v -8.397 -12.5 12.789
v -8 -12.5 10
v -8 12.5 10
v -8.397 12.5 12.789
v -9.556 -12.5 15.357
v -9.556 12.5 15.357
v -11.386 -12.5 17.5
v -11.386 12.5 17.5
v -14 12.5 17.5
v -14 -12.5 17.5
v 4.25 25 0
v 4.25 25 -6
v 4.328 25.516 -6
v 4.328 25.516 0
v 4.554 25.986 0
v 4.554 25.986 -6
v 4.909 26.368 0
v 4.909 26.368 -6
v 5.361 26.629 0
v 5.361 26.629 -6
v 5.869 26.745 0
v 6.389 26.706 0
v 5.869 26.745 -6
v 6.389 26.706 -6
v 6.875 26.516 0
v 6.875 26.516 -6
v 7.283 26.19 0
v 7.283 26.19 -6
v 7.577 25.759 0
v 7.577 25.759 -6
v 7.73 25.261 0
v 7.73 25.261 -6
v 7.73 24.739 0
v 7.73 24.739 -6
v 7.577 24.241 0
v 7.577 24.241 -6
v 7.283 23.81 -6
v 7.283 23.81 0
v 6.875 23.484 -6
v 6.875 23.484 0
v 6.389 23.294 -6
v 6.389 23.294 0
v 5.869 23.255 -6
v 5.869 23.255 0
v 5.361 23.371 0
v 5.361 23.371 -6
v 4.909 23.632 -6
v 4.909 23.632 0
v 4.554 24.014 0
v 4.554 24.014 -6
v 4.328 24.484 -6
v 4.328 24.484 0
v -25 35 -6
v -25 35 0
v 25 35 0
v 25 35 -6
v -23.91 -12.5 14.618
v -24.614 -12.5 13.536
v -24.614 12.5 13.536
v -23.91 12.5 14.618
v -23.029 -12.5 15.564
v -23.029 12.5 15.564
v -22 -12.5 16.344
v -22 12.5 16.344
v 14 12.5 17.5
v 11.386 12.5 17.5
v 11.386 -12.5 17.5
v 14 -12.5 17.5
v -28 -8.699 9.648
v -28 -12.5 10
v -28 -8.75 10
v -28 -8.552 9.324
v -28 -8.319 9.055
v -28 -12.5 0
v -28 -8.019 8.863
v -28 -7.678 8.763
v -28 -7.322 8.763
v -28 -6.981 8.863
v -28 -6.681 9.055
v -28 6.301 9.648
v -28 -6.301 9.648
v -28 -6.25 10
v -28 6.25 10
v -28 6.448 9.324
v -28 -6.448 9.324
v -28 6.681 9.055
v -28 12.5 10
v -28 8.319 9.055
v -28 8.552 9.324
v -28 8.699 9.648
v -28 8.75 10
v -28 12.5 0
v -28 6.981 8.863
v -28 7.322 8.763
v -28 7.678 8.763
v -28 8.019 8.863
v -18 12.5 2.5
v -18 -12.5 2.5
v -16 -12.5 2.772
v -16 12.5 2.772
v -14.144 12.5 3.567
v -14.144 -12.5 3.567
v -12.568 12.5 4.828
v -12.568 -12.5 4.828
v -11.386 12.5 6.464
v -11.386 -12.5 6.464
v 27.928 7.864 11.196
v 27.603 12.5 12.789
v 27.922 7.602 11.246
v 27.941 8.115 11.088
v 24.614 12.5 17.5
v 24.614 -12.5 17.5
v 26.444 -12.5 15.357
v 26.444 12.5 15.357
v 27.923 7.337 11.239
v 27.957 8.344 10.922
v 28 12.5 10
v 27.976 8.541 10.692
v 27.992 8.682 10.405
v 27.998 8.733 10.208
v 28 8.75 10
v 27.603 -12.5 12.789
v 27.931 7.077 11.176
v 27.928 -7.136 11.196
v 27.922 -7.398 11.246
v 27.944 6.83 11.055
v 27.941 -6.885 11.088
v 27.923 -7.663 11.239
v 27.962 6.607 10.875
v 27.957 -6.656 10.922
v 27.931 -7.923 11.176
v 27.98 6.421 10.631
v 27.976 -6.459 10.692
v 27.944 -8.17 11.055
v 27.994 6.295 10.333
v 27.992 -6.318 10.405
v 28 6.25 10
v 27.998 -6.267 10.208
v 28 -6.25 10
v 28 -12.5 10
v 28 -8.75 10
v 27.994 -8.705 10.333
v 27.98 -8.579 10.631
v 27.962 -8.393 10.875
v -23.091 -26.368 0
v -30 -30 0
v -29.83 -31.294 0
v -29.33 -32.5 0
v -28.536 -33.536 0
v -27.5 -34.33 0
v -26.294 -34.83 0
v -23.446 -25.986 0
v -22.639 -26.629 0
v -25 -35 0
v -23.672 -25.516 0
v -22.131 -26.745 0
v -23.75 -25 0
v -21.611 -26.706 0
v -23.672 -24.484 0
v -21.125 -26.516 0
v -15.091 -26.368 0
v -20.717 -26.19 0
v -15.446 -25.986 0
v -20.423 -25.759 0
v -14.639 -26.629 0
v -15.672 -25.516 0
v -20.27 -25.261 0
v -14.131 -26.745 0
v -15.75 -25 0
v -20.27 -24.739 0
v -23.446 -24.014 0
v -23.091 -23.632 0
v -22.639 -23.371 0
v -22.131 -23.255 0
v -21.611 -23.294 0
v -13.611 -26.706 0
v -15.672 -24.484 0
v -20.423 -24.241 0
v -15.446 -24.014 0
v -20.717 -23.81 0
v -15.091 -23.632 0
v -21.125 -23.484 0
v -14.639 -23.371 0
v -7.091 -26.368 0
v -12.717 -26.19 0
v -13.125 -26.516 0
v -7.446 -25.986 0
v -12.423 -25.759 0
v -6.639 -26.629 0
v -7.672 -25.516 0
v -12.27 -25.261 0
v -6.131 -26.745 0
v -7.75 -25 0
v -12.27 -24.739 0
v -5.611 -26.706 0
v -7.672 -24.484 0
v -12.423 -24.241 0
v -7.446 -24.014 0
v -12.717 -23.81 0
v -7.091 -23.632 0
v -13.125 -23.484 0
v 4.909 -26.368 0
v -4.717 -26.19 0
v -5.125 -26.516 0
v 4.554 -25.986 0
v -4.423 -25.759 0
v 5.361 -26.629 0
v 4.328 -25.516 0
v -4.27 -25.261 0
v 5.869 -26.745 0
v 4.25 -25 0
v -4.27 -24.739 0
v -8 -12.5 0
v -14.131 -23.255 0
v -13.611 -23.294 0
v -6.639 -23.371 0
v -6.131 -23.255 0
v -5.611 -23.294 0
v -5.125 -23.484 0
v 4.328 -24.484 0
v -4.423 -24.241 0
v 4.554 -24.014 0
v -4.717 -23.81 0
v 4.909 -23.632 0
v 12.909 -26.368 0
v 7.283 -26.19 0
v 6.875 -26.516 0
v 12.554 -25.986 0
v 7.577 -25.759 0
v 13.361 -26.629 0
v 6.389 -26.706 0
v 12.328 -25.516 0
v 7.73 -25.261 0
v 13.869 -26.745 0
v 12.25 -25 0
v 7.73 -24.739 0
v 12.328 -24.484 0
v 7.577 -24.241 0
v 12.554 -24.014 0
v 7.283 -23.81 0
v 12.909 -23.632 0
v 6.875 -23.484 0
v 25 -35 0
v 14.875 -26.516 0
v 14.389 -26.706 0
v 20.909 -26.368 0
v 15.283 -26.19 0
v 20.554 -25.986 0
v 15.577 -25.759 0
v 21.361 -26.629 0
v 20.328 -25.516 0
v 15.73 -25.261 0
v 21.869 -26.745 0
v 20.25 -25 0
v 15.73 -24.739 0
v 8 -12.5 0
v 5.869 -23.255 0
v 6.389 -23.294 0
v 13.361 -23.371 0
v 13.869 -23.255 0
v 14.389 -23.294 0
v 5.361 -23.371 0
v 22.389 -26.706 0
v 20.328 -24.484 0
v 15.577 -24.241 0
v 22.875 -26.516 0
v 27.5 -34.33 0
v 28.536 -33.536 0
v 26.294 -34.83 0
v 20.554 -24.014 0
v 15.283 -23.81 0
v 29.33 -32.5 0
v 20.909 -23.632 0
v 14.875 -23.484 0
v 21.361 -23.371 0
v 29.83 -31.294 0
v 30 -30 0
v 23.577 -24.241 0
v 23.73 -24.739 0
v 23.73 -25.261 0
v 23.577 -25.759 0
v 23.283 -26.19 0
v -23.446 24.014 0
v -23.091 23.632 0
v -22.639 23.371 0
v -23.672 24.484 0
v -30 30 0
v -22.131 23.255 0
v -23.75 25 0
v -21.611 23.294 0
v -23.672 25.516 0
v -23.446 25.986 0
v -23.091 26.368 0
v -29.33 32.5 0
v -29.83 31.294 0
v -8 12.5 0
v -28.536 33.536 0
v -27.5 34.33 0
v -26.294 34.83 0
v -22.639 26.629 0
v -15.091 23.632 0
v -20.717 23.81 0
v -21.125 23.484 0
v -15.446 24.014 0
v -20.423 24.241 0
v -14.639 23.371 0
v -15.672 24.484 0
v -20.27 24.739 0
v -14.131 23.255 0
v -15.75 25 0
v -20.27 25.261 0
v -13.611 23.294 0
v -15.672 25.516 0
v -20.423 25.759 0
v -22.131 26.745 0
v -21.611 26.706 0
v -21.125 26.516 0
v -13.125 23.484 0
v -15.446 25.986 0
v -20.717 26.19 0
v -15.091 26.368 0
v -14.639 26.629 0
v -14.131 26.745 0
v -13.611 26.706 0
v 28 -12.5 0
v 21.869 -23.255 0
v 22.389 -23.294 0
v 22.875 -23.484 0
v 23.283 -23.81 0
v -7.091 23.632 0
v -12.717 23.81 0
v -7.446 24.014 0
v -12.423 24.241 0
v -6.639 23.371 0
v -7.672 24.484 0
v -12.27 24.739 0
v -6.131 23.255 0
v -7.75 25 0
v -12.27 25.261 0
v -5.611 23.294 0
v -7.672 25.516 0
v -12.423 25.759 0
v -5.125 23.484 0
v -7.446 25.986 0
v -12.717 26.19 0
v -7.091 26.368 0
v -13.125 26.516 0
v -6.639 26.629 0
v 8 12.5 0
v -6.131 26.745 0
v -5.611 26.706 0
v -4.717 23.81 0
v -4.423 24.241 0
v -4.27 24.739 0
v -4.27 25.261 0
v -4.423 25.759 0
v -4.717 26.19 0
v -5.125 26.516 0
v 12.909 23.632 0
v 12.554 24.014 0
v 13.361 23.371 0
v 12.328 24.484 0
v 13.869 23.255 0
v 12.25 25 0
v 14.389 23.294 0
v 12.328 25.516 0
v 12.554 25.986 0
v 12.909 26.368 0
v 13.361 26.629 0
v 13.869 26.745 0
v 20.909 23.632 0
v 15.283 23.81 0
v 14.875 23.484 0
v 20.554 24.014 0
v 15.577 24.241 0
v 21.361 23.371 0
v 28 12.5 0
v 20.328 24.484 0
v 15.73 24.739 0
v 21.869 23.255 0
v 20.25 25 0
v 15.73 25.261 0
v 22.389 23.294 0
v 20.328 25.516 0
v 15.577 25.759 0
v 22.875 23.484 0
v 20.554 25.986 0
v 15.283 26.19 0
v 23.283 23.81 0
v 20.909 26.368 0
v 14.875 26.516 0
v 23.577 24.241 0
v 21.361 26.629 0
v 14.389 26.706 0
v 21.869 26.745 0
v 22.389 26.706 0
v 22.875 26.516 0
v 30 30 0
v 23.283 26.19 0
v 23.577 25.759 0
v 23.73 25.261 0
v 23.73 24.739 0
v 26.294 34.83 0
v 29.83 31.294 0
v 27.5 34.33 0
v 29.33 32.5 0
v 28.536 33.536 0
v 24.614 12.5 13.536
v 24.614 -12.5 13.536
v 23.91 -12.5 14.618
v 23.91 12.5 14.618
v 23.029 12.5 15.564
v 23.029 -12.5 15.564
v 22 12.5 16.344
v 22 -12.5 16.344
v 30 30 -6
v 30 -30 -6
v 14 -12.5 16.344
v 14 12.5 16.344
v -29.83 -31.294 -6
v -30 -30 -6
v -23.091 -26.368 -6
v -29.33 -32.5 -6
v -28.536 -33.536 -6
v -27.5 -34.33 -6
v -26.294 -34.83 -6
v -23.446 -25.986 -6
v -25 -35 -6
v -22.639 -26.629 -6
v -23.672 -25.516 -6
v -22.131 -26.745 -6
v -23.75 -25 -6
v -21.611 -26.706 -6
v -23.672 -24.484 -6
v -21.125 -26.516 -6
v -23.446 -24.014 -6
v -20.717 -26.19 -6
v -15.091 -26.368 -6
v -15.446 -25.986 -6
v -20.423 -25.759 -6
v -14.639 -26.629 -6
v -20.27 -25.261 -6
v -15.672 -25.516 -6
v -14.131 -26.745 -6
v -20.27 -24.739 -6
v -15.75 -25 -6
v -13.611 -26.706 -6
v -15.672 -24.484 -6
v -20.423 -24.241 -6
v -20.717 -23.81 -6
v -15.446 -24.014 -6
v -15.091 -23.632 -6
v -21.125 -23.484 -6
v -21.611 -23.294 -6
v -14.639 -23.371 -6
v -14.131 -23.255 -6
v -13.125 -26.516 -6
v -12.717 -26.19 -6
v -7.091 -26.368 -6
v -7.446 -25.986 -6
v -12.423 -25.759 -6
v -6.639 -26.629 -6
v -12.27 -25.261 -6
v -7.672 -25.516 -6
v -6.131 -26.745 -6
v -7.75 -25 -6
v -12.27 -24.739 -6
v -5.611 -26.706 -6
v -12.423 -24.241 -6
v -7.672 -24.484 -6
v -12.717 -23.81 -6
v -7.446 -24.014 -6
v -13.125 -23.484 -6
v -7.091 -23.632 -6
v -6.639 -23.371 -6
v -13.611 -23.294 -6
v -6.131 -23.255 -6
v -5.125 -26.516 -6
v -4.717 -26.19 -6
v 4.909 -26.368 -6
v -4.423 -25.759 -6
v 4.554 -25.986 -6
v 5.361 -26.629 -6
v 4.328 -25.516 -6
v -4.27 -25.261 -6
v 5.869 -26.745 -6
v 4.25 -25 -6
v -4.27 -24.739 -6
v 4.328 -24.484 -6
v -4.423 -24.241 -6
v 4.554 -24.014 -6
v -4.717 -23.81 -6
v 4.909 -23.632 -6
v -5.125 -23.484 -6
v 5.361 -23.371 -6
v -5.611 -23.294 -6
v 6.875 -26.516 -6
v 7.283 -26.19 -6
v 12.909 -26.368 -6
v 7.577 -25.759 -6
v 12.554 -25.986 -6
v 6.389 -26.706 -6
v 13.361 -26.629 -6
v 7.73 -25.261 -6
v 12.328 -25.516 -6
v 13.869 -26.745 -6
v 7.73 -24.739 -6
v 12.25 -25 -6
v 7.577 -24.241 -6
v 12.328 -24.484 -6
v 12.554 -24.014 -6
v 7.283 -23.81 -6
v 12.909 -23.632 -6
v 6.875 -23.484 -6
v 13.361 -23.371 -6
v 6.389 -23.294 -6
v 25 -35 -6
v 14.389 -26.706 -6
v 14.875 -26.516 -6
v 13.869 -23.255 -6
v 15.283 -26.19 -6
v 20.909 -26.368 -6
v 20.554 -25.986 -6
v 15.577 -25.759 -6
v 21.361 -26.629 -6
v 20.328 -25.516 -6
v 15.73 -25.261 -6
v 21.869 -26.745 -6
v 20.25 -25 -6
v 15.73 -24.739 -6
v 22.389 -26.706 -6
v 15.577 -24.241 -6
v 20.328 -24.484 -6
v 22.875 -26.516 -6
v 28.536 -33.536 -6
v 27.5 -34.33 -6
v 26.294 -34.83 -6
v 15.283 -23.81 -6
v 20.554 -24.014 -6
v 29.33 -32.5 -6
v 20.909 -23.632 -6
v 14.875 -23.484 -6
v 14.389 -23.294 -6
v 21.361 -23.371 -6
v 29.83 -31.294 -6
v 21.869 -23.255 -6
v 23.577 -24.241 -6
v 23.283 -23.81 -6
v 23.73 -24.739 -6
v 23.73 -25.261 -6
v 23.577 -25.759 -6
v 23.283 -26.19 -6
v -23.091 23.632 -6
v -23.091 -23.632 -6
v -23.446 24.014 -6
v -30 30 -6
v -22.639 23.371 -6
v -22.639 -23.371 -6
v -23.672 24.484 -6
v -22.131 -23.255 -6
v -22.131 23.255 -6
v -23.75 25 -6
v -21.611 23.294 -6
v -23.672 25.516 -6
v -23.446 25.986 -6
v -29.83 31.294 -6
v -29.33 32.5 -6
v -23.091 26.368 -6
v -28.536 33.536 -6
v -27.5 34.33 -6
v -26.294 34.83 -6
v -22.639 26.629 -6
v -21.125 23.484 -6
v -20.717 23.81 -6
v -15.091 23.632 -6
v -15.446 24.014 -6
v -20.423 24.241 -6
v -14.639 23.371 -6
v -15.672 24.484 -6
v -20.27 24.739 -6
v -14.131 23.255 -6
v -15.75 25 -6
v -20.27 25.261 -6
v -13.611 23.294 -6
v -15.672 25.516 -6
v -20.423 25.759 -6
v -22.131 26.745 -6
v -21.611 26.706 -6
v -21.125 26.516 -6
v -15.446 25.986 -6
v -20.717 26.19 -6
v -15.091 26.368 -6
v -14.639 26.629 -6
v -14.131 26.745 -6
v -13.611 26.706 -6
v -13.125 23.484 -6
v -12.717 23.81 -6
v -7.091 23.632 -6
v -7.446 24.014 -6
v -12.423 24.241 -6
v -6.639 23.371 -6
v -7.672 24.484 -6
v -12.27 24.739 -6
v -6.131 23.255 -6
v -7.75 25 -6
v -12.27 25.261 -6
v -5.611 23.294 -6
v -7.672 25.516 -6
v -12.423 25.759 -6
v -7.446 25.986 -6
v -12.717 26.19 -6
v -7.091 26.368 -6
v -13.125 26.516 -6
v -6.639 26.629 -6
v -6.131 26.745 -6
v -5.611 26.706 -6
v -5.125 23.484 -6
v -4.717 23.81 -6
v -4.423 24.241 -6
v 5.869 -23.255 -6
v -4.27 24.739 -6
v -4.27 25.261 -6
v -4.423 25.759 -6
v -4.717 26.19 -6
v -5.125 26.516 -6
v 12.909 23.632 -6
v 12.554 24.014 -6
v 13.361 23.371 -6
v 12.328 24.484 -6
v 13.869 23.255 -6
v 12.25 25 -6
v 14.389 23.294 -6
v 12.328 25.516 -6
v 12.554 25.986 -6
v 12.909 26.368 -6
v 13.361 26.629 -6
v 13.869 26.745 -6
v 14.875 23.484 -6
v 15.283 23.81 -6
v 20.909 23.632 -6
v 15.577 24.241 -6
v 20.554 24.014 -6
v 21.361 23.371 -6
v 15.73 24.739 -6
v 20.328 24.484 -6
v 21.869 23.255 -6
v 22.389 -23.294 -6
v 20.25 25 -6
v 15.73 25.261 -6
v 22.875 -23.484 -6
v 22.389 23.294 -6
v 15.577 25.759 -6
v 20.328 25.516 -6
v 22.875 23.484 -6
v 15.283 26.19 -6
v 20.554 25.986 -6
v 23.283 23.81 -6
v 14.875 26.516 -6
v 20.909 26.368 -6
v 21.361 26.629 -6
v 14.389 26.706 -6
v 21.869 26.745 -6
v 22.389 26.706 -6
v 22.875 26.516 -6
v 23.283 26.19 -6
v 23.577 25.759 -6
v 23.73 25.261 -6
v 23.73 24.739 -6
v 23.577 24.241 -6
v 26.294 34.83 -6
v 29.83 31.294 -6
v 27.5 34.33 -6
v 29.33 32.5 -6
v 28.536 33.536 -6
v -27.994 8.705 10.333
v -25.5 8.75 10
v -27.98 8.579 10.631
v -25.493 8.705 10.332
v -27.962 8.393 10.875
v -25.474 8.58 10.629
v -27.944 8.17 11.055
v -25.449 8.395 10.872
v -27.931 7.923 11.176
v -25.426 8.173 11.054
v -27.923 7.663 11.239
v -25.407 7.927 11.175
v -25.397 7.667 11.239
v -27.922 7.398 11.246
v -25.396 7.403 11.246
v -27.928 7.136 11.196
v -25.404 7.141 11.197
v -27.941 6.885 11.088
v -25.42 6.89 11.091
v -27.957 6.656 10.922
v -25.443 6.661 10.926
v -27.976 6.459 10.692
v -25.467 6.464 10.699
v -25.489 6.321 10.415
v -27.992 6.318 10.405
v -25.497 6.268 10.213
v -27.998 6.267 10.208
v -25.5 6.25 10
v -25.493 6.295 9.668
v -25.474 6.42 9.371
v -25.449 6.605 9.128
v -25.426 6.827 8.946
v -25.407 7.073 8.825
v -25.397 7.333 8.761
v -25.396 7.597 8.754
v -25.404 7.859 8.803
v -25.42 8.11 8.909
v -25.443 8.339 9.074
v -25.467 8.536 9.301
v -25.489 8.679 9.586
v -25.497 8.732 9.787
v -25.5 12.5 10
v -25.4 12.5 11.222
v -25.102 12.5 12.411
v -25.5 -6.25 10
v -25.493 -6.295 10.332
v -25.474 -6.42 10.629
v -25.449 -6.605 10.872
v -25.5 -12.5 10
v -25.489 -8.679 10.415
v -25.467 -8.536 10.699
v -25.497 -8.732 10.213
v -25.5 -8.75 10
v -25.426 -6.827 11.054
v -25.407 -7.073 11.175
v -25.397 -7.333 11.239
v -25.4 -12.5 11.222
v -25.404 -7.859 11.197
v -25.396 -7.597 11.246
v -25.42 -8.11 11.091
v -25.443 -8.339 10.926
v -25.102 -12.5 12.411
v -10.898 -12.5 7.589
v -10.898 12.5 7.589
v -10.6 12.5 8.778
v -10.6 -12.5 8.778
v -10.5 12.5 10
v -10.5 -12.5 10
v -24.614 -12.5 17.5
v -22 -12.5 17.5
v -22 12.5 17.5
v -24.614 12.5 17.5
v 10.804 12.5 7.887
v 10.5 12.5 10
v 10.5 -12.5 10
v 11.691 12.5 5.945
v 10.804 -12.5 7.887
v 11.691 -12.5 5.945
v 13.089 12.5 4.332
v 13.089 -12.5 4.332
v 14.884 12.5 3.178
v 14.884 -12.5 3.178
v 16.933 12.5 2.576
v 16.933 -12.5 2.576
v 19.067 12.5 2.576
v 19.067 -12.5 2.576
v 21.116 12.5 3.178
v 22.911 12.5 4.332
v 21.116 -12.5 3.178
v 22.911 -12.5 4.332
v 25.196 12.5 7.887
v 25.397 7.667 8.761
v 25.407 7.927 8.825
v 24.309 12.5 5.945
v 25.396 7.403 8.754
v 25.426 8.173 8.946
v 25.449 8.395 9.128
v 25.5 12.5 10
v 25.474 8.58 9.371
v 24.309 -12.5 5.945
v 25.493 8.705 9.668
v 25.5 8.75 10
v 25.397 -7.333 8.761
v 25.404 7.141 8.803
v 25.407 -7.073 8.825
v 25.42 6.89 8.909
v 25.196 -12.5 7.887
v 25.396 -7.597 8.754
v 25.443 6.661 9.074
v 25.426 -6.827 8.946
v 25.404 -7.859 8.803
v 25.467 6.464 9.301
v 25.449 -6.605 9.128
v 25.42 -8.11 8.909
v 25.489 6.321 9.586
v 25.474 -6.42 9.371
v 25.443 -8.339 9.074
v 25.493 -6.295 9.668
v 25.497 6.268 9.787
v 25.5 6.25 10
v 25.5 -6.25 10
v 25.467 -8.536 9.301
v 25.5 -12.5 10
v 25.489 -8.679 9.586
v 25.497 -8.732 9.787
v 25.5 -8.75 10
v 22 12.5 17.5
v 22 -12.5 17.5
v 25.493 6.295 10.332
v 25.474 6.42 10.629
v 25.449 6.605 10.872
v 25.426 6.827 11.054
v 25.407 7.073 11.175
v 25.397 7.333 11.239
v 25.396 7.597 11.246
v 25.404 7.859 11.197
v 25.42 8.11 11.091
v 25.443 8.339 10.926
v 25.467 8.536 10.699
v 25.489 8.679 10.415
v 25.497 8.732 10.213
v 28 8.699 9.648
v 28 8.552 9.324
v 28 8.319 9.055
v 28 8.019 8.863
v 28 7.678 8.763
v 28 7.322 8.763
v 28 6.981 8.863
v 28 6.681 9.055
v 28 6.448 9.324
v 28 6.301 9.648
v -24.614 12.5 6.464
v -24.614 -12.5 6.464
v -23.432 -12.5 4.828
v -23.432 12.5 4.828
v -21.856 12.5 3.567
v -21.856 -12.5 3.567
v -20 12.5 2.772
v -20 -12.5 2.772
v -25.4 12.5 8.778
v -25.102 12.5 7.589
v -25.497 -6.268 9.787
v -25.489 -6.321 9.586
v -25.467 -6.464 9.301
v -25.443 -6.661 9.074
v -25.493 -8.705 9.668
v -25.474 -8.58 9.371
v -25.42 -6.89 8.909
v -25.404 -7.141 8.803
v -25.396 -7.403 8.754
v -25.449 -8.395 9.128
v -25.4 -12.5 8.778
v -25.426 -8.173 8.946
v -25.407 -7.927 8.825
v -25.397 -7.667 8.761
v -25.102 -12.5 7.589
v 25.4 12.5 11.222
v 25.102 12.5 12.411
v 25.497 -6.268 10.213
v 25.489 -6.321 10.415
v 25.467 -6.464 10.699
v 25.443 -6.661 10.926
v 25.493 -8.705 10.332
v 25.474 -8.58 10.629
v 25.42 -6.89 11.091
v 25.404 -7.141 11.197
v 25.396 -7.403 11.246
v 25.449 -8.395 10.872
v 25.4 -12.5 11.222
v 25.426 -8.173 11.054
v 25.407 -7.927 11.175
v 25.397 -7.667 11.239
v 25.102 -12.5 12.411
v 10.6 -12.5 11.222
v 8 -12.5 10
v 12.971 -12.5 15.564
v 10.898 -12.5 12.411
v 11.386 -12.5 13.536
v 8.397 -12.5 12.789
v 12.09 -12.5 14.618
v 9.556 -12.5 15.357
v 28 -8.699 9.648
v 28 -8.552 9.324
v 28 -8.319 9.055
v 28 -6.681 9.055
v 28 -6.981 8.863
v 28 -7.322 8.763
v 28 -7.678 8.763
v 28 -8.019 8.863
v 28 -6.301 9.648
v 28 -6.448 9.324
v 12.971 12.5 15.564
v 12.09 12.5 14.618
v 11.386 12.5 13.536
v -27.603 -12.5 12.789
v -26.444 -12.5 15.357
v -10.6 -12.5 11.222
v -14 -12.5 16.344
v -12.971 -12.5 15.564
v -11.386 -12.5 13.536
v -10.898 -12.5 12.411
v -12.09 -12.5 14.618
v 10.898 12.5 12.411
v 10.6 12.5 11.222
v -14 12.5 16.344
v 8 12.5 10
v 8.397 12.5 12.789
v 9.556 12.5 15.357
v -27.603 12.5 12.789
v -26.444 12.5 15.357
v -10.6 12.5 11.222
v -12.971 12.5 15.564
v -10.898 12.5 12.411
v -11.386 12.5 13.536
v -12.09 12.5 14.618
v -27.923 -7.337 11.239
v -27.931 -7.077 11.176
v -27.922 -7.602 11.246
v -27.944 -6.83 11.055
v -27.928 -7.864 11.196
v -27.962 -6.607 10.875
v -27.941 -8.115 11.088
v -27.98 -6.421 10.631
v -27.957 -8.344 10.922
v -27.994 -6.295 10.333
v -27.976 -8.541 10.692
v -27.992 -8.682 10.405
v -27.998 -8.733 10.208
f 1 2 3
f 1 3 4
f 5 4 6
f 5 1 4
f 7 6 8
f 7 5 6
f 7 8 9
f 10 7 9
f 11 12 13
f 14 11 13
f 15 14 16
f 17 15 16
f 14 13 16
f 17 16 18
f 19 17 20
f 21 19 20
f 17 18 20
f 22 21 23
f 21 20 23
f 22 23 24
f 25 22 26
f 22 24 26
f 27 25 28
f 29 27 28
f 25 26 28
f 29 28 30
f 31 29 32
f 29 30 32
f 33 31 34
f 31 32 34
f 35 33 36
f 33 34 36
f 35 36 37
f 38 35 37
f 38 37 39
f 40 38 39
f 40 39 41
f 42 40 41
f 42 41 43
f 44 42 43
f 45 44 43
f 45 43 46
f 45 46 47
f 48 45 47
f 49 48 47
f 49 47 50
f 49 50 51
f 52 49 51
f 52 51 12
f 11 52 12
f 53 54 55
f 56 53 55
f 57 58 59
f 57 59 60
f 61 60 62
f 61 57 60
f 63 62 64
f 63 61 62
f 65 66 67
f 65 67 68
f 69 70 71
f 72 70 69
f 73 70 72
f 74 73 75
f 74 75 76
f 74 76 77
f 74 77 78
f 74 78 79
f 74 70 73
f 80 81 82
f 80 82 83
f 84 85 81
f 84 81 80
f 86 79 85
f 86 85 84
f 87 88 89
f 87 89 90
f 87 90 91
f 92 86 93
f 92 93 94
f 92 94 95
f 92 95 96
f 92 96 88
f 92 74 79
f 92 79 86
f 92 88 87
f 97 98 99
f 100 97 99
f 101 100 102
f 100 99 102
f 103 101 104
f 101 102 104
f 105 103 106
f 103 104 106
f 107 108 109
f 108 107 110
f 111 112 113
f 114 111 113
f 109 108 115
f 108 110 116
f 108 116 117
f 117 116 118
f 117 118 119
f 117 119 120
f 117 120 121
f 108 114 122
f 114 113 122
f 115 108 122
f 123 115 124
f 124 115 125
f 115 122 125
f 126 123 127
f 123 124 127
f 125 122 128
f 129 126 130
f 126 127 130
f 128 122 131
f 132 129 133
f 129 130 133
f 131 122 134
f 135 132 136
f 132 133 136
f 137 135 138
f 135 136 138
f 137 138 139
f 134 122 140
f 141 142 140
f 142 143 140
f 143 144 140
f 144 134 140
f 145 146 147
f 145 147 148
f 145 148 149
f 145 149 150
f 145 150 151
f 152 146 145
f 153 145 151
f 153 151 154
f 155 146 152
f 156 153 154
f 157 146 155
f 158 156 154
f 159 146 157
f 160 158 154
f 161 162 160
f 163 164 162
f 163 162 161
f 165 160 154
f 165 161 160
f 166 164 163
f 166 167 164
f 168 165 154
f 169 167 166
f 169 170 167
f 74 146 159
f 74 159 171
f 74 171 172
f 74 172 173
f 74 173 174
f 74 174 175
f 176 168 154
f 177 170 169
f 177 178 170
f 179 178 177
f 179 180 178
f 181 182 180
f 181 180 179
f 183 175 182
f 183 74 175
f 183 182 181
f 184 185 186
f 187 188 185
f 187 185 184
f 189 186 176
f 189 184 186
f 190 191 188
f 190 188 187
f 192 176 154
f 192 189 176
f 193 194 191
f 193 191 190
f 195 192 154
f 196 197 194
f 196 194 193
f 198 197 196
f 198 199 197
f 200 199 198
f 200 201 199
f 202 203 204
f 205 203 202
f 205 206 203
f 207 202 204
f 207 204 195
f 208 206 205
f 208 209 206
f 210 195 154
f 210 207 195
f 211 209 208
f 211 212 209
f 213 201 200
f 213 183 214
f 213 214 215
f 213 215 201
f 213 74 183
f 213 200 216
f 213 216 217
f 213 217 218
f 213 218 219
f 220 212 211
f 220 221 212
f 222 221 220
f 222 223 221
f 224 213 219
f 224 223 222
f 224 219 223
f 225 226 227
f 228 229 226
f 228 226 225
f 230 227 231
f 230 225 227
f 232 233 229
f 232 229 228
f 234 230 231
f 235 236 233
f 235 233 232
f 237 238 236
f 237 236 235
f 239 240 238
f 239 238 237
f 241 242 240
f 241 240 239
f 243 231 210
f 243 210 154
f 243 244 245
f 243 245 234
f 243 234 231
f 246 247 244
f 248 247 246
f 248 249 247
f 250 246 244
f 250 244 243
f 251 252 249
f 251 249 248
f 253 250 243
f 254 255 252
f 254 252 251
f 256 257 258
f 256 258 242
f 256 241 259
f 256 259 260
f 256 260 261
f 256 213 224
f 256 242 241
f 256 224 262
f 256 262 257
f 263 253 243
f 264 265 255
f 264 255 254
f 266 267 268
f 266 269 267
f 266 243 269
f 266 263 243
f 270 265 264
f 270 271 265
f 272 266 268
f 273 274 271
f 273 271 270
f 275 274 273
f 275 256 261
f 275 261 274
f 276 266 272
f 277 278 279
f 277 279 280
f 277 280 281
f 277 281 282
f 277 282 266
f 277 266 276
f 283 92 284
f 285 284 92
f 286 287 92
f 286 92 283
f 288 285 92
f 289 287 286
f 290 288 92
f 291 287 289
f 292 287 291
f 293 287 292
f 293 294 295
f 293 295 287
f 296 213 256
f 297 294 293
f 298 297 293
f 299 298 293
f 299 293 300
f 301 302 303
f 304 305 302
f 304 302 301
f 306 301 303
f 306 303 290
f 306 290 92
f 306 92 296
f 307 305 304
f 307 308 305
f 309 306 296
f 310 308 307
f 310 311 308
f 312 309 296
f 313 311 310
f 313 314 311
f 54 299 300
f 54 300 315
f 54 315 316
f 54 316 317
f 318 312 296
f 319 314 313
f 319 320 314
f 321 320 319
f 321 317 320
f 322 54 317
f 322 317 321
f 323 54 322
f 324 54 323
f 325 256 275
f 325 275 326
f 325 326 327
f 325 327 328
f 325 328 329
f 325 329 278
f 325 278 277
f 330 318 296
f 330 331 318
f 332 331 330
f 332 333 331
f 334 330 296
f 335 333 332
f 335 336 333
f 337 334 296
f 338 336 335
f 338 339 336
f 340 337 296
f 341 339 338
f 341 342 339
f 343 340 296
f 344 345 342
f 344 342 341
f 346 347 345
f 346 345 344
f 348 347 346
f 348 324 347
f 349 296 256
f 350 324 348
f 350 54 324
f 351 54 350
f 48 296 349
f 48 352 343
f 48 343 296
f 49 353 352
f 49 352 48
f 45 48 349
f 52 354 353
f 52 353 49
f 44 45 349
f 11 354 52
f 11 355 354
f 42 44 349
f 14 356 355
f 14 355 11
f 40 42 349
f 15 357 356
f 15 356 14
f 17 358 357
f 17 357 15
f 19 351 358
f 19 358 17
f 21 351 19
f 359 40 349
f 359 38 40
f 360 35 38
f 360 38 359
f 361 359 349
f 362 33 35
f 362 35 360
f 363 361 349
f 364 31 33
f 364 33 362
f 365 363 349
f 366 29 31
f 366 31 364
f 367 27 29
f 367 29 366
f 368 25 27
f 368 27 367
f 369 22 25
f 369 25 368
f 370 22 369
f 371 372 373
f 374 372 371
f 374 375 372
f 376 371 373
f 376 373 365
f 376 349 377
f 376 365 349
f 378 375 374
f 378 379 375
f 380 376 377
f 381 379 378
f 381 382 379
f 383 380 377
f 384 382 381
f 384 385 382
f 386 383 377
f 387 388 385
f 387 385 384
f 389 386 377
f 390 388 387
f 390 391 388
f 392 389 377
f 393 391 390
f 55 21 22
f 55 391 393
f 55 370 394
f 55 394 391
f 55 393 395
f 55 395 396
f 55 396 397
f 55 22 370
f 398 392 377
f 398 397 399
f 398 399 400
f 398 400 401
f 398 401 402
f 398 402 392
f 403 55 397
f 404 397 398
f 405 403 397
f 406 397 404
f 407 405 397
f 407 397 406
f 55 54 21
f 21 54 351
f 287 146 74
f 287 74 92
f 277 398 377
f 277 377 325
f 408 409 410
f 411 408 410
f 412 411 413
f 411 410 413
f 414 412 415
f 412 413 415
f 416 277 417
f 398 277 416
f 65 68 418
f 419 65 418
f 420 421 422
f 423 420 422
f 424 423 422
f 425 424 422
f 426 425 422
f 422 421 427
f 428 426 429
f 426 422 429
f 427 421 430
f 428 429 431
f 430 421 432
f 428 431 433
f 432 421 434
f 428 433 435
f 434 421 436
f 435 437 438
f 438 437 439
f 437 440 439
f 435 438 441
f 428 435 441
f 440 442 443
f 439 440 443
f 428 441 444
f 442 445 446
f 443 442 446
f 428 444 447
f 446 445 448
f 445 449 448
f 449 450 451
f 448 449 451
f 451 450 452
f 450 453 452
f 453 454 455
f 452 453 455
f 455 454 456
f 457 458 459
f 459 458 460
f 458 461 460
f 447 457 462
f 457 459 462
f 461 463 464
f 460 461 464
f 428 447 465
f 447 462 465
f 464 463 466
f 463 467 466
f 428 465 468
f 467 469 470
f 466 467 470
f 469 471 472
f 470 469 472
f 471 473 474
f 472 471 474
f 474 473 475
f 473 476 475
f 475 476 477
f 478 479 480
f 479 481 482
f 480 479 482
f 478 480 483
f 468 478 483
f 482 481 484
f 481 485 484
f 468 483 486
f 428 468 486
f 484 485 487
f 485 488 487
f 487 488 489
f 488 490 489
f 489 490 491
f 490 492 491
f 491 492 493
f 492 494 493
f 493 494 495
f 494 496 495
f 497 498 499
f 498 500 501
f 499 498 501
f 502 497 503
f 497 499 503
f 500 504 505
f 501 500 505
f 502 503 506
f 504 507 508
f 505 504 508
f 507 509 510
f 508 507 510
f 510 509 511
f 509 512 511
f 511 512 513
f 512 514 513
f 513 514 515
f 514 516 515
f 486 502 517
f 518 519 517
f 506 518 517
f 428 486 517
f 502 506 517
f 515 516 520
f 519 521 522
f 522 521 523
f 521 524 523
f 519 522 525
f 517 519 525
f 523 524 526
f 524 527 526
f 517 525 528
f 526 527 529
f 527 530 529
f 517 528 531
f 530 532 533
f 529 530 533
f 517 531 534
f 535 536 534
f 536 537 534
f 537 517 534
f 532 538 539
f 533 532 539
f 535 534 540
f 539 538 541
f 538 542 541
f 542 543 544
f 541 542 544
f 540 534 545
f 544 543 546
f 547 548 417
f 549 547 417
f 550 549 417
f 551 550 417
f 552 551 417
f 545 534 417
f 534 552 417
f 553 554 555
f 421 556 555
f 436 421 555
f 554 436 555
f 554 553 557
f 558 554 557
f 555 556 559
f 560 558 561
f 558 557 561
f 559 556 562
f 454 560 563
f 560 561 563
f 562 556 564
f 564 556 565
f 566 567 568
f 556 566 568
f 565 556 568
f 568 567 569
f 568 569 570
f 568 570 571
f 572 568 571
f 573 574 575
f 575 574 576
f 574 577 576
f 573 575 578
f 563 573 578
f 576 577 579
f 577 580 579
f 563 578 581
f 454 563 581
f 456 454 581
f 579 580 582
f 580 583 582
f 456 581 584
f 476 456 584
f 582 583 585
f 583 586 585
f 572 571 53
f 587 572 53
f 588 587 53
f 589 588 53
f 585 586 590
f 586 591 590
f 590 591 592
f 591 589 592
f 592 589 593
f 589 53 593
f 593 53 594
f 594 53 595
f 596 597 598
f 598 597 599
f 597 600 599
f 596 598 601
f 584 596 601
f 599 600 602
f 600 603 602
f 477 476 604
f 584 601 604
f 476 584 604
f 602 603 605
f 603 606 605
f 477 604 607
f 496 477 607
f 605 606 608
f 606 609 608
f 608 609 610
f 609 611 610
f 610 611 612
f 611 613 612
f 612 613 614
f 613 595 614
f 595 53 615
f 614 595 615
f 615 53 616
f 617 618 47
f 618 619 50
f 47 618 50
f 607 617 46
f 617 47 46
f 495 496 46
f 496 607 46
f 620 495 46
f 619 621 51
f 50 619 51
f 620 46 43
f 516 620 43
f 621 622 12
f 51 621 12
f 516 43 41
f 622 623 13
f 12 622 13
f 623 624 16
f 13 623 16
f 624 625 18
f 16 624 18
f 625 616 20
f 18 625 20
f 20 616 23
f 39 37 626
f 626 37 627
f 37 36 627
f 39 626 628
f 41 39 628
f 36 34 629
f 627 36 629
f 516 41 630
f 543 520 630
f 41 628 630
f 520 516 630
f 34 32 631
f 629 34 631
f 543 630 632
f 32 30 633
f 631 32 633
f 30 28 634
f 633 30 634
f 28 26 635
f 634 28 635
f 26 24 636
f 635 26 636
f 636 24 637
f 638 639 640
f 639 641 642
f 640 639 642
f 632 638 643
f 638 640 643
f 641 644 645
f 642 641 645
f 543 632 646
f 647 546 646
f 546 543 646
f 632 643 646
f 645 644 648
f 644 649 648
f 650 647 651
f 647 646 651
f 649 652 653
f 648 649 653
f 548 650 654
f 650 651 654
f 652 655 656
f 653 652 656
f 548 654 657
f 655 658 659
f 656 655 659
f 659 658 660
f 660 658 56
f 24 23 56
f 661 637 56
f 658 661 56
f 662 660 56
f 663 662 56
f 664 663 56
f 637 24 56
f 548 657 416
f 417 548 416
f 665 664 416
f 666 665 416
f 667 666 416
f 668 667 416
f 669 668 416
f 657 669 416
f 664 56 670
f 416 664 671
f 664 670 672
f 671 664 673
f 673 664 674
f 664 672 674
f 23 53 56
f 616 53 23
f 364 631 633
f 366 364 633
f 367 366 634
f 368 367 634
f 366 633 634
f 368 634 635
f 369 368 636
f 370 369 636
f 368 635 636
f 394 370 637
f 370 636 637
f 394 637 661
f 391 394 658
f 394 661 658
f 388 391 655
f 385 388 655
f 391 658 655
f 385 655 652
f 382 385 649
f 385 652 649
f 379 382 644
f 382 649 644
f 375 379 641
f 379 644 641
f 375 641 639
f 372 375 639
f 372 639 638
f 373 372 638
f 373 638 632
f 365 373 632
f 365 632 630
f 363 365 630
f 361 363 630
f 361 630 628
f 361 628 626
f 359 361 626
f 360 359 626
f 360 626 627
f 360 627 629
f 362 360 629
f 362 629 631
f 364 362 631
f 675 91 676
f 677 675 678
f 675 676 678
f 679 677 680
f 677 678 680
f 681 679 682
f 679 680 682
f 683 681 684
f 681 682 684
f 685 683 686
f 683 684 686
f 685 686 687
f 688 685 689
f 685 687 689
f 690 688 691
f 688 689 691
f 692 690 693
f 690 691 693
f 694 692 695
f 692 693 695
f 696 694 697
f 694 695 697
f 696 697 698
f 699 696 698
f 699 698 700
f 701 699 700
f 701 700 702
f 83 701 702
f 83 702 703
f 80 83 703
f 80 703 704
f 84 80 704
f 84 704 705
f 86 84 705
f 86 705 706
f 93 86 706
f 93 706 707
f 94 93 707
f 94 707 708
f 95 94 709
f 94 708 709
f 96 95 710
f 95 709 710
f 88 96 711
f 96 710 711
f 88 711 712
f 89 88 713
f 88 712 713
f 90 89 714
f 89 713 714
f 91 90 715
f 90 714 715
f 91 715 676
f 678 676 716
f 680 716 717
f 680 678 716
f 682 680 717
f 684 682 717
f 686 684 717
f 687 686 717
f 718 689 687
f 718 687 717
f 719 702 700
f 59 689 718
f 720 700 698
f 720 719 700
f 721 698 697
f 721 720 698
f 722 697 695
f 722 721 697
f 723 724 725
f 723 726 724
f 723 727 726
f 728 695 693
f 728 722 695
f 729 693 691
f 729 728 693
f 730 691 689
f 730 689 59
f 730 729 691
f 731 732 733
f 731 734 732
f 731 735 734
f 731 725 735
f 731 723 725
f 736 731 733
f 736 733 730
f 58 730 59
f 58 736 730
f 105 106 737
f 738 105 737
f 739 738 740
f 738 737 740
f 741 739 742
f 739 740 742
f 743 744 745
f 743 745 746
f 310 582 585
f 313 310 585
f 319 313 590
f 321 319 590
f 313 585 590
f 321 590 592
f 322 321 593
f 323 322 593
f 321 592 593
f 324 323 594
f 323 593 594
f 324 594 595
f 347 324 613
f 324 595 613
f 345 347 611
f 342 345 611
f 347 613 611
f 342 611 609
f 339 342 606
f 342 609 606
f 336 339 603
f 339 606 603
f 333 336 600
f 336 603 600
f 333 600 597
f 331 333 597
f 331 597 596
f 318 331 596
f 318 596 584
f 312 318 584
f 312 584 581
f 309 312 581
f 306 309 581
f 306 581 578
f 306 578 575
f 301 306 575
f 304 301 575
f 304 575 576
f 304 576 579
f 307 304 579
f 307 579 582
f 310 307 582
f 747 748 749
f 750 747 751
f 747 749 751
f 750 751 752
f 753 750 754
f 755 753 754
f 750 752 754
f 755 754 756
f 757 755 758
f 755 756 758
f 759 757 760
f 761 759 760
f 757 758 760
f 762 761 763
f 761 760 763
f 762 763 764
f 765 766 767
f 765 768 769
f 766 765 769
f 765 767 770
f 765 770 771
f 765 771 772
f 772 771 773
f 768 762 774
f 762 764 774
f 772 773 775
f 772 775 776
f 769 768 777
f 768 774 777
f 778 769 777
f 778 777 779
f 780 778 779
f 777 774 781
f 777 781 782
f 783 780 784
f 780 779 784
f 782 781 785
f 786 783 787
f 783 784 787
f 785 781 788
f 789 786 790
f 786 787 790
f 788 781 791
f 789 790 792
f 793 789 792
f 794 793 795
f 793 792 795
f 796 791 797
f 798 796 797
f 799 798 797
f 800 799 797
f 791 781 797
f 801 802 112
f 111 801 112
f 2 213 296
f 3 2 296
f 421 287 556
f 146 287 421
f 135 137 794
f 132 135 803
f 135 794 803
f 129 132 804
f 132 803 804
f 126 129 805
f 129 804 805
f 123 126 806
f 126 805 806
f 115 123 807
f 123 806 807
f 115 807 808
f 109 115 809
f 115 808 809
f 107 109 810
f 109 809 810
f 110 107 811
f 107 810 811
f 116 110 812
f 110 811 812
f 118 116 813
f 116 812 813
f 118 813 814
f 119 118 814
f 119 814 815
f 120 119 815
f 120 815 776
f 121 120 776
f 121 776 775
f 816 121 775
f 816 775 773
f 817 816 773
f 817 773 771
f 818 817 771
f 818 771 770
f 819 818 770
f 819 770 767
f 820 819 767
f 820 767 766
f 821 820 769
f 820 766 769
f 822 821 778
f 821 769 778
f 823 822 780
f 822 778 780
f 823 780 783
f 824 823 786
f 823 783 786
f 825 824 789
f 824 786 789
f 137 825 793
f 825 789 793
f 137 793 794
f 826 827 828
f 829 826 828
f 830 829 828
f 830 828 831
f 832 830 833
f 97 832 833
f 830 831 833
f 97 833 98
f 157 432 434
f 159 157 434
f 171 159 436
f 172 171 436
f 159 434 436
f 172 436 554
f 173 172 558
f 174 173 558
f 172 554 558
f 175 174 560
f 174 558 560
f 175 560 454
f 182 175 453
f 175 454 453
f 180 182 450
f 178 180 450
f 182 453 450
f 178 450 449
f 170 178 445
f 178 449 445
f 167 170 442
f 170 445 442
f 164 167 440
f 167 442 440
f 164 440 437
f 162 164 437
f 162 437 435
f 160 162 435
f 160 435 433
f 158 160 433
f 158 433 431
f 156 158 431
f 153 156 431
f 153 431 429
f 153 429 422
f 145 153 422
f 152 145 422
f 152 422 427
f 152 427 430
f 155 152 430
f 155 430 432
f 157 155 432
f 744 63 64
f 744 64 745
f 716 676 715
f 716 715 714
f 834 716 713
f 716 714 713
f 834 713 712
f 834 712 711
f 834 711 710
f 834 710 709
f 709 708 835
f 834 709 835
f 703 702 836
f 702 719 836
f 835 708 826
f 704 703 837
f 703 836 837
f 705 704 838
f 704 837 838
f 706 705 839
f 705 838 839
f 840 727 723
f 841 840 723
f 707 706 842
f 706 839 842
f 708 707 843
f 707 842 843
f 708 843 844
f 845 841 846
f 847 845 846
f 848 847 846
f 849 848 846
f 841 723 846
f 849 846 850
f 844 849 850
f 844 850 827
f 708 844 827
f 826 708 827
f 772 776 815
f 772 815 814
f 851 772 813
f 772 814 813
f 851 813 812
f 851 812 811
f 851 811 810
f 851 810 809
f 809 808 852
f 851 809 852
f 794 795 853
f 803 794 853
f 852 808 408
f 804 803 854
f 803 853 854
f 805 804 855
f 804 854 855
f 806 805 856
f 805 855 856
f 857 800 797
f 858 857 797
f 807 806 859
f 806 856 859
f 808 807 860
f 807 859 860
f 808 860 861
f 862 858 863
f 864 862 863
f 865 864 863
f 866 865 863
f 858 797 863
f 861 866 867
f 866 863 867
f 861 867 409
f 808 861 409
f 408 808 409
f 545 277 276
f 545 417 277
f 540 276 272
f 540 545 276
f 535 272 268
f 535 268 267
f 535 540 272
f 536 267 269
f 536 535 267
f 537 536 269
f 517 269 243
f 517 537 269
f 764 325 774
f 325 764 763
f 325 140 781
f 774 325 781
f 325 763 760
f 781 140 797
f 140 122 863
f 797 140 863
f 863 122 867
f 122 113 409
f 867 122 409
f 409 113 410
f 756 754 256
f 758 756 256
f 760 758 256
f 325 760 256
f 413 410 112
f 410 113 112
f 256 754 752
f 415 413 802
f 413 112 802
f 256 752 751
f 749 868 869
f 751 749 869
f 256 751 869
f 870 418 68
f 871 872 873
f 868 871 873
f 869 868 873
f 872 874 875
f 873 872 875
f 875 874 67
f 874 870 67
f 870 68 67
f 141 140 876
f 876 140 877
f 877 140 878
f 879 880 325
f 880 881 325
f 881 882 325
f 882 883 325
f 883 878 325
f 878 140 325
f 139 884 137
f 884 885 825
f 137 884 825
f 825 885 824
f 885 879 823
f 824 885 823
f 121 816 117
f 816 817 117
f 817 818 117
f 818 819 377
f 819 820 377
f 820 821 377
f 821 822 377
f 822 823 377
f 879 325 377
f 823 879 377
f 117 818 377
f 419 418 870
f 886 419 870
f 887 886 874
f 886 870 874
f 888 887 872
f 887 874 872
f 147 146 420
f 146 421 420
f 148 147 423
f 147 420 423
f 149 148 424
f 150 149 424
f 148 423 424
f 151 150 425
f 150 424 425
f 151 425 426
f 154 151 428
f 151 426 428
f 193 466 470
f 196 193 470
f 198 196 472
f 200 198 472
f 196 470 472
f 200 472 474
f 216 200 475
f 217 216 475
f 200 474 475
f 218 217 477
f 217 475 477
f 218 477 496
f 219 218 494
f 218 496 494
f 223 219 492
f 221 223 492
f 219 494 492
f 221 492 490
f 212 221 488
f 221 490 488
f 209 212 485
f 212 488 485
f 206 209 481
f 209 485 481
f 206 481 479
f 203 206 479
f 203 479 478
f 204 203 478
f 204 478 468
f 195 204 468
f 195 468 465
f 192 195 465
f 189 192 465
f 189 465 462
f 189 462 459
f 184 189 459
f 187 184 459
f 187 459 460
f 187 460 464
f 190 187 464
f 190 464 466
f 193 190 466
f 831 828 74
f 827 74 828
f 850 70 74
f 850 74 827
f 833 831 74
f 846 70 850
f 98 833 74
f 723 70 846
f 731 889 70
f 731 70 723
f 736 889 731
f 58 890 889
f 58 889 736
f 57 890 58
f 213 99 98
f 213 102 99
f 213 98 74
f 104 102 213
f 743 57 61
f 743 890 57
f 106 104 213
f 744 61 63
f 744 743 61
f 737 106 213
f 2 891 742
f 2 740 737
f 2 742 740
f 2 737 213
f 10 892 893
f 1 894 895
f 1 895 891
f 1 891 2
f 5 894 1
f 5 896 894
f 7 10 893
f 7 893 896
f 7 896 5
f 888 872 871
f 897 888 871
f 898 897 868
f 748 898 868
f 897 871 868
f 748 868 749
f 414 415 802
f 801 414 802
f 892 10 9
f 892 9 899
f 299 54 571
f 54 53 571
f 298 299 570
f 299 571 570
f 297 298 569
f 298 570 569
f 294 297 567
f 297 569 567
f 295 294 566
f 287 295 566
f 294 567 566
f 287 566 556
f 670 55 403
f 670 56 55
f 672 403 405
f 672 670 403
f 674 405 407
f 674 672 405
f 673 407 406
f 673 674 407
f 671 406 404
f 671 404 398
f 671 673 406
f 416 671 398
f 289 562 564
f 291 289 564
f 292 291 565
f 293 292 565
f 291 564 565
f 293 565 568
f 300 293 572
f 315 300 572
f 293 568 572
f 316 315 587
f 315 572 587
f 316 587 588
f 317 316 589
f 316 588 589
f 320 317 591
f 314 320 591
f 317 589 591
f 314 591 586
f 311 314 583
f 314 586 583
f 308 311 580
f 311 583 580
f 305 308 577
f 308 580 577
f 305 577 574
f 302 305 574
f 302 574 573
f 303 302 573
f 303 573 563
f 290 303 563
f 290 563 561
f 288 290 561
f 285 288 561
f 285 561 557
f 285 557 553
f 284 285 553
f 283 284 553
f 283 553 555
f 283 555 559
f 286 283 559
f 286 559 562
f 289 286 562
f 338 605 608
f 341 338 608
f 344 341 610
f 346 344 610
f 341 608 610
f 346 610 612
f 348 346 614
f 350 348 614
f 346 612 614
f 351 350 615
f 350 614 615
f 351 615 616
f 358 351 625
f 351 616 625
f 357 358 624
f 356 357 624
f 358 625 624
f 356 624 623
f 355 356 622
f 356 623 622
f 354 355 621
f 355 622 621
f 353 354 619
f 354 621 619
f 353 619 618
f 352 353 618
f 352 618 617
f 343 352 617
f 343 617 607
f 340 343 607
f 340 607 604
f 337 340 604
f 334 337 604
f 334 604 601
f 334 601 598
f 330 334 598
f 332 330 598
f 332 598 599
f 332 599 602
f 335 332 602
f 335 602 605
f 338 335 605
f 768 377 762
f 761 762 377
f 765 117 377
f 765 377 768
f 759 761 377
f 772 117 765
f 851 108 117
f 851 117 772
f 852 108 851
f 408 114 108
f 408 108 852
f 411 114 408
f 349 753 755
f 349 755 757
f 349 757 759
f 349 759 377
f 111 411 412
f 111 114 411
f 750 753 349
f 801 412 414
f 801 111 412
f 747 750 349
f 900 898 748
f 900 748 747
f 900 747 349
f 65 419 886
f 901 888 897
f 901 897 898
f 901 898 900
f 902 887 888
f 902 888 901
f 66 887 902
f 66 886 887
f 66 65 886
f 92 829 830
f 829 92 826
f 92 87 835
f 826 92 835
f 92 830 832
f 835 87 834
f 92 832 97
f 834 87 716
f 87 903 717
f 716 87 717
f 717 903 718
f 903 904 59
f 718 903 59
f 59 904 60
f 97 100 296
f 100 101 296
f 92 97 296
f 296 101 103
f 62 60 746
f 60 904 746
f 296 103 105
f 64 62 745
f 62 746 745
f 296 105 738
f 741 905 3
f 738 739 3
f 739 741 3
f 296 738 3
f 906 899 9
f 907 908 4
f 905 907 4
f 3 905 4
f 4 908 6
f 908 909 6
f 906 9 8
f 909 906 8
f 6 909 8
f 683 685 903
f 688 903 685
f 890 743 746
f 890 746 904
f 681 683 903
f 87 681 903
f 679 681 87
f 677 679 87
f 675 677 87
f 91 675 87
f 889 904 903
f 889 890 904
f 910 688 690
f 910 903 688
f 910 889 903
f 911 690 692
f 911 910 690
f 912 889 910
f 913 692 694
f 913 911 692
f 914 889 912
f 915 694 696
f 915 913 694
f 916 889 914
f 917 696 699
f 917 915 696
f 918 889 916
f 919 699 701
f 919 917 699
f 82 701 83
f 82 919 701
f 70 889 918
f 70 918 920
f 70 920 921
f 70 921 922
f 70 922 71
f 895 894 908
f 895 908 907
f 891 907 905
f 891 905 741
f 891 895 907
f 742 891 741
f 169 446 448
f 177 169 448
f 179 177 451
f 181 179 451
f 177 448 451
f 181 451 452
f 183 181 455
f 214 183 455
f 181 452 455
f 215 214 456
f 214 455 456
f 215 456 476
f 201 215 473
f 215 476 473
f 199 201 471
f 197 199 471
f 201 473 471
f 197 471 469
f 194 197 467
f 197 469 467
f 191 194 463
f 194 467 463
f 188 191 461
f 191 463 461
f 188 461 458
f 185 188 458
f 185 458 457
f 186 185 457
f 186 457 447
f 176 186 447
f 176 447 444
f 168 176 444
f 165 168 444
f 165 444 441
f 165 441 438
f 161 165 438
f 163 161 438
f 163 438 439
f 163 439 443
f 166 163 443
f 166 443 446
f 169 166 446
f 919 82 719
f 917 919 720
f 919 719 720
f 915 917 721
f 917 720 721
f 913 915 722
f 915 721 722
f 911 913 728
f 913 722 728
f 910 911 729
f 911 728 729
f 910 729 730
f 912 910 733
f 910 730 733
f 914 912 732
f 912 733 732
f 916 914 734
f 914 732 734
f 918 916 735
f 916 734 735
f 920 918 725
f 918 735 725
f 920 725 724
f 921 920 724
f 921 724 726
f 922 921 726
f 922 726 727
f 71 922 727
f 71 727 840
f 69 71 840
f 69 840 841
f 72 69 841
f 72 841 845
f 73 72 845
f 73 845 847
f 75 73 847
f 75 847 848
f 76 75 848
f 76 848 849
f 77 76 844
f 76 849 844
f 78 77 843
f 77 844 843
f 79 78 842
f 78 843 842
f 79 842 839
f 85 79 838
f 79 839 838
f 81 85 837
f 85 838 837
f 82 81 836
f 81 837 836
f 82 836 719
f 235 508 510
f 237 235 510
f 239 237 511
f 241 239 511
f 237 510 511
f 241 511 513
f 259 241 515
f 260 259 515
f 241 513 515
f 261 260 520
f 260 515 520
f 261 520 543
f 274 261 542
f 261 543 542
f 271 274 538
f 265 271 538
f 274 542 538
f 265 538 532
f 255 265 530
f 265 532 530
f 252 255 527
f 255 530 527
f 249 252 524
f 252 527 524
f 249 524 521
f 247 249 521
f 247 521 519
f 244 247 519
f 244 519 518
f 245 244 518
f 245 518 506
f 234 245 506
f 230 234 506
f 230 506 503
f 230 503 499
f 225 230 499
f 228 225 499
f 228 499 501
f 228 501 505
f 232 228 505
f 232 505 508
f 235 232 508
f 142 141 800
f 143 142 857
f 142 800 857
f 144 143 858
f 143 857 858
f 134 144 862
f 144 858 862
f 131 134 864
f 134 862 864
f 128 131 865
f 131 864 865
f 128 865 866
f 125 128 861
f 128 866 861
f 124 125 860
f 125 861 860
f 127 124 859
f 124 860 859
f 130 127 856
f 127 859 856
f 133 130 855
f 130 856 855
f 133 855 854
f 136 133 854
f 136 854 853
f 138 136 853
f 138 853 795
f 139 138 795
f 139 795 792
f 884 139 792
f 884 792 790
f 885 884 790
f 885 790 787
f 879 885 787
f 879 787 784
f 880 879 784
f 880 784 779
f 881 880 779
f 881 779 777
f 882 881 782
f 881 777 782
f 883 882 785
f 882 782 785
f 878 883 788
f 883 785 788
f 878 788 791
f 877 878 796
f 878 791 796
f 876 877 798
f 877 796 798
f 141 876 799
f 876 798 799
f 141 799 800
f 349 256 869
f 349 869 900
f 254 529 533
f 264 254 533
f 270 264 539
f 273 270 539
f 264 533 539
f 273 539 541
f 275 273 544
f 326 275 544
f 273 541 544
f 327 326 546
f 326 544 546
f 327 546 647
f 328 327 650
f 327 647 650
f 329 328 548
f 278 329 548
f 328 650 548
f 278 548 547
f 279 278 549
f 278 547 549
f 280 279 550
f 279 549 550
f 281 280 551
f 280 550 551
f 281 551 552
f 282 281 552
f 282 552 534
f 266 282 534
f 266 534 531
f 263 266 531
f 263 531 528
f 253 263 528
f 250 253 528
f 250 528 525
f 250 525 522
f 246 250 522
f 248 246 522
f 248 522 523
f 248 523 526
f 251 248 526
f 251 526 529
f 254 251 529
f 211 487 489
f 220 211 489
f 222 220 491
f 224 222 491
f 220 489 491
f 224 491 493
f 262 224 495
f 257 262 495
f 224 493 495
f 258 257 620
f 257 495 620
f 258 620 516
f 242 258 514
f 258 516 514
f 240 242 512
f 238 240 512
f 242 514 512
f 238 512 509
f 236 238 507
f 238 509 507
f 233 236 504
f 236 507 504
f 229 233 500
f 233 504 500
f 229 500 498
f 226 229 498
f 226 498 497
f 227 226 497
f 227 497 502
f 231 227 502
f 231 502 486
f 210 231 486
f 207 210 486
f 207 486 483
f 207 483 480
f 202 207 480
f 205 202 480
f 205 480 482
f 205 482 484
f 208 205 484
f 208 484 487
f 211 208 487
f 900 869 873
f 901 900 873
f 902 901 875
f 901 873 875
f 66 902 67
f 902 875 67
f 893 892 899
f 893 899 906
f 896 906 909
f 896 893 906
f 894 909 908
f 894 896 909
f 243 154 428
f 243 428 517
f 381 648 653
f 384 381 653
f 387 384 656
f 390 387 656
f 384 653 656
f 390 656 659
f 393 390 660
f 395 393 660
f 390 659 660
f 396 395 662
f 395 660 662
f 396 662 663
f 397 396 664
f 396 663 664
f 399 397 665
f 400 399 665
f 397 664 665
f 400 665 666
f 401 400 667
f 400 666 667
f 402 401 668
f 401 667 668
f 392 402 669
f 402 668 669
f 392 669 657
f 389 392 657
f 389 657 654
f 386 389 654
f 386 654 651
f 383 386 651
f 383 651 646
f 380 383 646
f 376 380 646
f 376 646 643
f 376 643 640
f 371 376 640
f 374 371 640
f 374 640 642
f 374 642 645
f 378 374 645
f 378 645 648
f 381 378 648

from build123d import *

# Parameters (mm, degrees)
F0_W      = 60
F0_H      = 50
F0_W_2    = 20
F0_H_2    = 25
F0_H_3    = 10
F1_DEPTH  = 6
F2_DEPTH  = 10
F4_DEPTH  = 25
F5_D      = 15
F8_DEPTH  = 25
F3_R      = 7.5
F9_DEPTH  = 25
F10_R     = 5
F12_D     = 2.5
F12_DEPTH = 10
F12_START = 0.0784327
F12_TIP   = 0.7510757738
F14_D     = 2.5
F14_DEPTH = 10
F14_START = 0.0784327
F14_TIP   = 0.7510757738
F15_D     = 3.5


with BuildPart() as f1:
    # F0 (on Top) → F1 (new body)
    with BuildSketch(Plane.XY):
        Rectangle(F0_W, F0_H)
        with Locations((-18, 0)):
            Rectangle(F0_W_2, F0_H_2, mode=Mode.SUBTRACT)
        with Locations((18, 0)):
            Rectangle(F0_W_2, F0_H_2, mode=Mode.SUBTRACT)
        with Locations((0, 30)):
            Rectangle(F0_W, F0_H_3)
        with Locations((0, -30)):
            Rectangle(F0_W, F0_H_3)
        with Locations((-18, 0)):
            Rectangle(F0_W_2, F0_H_2)
        with Locations((18, 0)):
            Rectangle(F0_W_2, F0_H_2)
    extrude(amount=-F1_DEPTH)

    # F0 (on Top) → F2 (join)
    with BuildSketch(Plane.XY):
        with Locations((-18, 0)):
            Rectangle(F0_W_2, F0_H_2)
        with Locations((18, 0)):
            Rectangle(F0_W_2, F0_H_2)
    extrude(amount=F2_DEPTH)

    # F5 (through all)
    with Locations(Plane.XZ.offset(12.5)):
        with Locations((-18, 10)):
            Hole(F5_D / 2)


with BuildPart() as f4:
    # F3 (on face) → F4 (new body)
    with BuildSketch(Plane.XZ.offset(12.5)):
        with BuildLine():
            Line((-24.6143782777, 13.5355339059), (-24.6143782777, 17.5))
            ThreePointArc((-24.6143782777, 17.5), (-27.1143782777, 14.1143782777), (-28, 10))
            Line((-28, 10), (-25.5, 10))
            ThreePointArc((-25.5, 10), (-25.2752263567, 11.8223834555), (-24.6143782777, 13.5355339059))
        make_face()
        with BuildLine():
            Line((-22, 17.5), (-24.6143782777, 17.5))
            Line((-24.6143782777, 17.5), (-24.6143782777, 13.5355339059))
            ThreePointArc((-24.6143782777, 13.5355339059), (-23.4898572411, 15.1099381085), (-22, 16.3442887702))
            Line((-22, 16.3442887702), (-22, 17.5))
        make_face()
    extrude(amount=-F4_DEPTH)


with BuildPart() as f4b:
    # F3 (on face) → F4, piece 2 (new body)
    with BuildSketch(Plane.XZ.offset(12.5)):
        with BuildLine():
            Line((-11.3856217223, 13.5355339059), (-11.3856217223, 17.5))
            Line((-11.3856217223, 17.5), (-14, 17.5))
            Line((-14, 17.5), (-14, 16.3442887702))
            ThreePointArc((-14, 16.3442887702), (-12.5101427589, 15.1099381085), (-11.3856217223, 13.5355339059))
        make_face()
        with BuildLine():
            Line((-10.5, 10), (-8, 10))
            ThreePointArc((-8, 10), (-8.8856217223, 14.1143782777), (-11.3856217223, 17.5))
            Line((-11.3856217223, 17.5), (-11.3856217223, 13.5355339059))
            ThreePointArc((-11.3856217223, 13.5355339059), (-10.7247736433, 11.8223834555), (-10.5, 10))
        make_face()
    extrude(amount=-F4_DEPTH)


with BuildPart() as f1_1:
    add(f1.part)

    # F6: union F4b, F4
    add(f4b.part)
    add(f4.part)

    # F7: F1 across plane


with BuildPart() as f1_2:
    add(f1_1.part)
    add(f1_1.part.mirror(Plane.YZ))

    # F3 (on face) → F8 (cut)
    with BuildSketch(Plane.XZ.offset(12.5)):
        with BuildLine():
            ThreePointArc((-24.6143782777, 6.4644660941), (-21.8557421922, 3.5670184092), (-18, 2.5))
            ThreePointArc((-18, 2.5), (-14.1442578078, 3.5670184092), (-11.3856217223, 6.4644660941))
            Line((-11.3856217223, 6.4644660941), (-11.3856217223, 10))
            Line((-11.3856217223, 10), (-24.6143782777, 10))
            Line((-24.6143782777, 10), (-24.6143782777, 6.4644660941))
        make_face()
        with BuildLine():
            ThreePointArc((-25.5, 10), (-25.2752263567, 8.1776165445), (-24.6143782777, 6.4644660941))
            Line((-24.6143782777, 6.4644660941), (-24.6143782777, 10))
            Line((-24.6143782777, 10), (-25.5, 10))
        make_face()
        with BuildLine():
            ThreePointArc((-11.3856217223, 6.4644660941), (-10.7247736433, 8.1776165445), (-10.5, 10))
            Line((-10.5, 10), (-11.3856217223, 10))
            Line((-11.3856217223, 10), (-11.3856217223, 6.4644660941))
        make_face()
    extrude(amount=-F8_DEPTH, mode=Mode.SUBTRACT)

    # F3 (on face) → F9 (cut)
    with BuildSketch(Plane.XZ.offset(12.5)):
        with Locations((18, 10)):
            Circle(F3_R)
    extrude(amount=-F9_DEPTH, mode=Mode.SUBTRACT)

    # F10
    f10_edges = [f1_2.edges().sort_by_distance(p)[0] for p in [
        (-30, -35, -3),
        (30, -35, -3),
        (30, 35, -3),
        (-30, 35, -3),
    ]]
    fillet(f10_edges, radius=F10_R)

    # F12
    # its depths count from where the whole tool has entered the part; down to there all is cleared
    with Locations(Plane.YZ.offset(28).offset(-F12_START)):
        with Locations((-7.5, 10), (7.5, 10)):
            Hole(F12_D / 2, depth=F12_DEPTH)
            with Locations((0, 0, -(F12_DEPTH + F12_TIP / 2))):  # 118° drill point
                Cone(0, F12_D / 2, F12_TIP, mode=Mode.SUBTRACT)

    # F14
    # its depths count from where the whole tool has entered the part; down to there all is cleared
    with Locations(Plane(origin=(-28, 0, 0), x_dir=(0, -1, 0), z_dir=(-1, 0, 0)).offset(-F14_START)):
        with Locations((-7.5, 10), (7.5, 10)):
            Hole(F14_D / 2, depth=F14_DEPTH)
            with Locations((0, 0, -(F14_DEPTH + F14_TIP / 2))):  # 118° drill point
                Cone(0, F14_D / 2, F14_TIP, mode=Mode.SUBTRACT)

    # F15 (through all)
    with Locations(Plane.XY):
        with Locations((-22, -25), (-14, -25), (-6, -25), (6, -25), (14, -25), (22, -25), (-22, 25), (-14, 25), (-6, 25), (6, 25), (14, 25), (22, 25)):
            Hole(F15_D / 2)


solid = f1_2.part
